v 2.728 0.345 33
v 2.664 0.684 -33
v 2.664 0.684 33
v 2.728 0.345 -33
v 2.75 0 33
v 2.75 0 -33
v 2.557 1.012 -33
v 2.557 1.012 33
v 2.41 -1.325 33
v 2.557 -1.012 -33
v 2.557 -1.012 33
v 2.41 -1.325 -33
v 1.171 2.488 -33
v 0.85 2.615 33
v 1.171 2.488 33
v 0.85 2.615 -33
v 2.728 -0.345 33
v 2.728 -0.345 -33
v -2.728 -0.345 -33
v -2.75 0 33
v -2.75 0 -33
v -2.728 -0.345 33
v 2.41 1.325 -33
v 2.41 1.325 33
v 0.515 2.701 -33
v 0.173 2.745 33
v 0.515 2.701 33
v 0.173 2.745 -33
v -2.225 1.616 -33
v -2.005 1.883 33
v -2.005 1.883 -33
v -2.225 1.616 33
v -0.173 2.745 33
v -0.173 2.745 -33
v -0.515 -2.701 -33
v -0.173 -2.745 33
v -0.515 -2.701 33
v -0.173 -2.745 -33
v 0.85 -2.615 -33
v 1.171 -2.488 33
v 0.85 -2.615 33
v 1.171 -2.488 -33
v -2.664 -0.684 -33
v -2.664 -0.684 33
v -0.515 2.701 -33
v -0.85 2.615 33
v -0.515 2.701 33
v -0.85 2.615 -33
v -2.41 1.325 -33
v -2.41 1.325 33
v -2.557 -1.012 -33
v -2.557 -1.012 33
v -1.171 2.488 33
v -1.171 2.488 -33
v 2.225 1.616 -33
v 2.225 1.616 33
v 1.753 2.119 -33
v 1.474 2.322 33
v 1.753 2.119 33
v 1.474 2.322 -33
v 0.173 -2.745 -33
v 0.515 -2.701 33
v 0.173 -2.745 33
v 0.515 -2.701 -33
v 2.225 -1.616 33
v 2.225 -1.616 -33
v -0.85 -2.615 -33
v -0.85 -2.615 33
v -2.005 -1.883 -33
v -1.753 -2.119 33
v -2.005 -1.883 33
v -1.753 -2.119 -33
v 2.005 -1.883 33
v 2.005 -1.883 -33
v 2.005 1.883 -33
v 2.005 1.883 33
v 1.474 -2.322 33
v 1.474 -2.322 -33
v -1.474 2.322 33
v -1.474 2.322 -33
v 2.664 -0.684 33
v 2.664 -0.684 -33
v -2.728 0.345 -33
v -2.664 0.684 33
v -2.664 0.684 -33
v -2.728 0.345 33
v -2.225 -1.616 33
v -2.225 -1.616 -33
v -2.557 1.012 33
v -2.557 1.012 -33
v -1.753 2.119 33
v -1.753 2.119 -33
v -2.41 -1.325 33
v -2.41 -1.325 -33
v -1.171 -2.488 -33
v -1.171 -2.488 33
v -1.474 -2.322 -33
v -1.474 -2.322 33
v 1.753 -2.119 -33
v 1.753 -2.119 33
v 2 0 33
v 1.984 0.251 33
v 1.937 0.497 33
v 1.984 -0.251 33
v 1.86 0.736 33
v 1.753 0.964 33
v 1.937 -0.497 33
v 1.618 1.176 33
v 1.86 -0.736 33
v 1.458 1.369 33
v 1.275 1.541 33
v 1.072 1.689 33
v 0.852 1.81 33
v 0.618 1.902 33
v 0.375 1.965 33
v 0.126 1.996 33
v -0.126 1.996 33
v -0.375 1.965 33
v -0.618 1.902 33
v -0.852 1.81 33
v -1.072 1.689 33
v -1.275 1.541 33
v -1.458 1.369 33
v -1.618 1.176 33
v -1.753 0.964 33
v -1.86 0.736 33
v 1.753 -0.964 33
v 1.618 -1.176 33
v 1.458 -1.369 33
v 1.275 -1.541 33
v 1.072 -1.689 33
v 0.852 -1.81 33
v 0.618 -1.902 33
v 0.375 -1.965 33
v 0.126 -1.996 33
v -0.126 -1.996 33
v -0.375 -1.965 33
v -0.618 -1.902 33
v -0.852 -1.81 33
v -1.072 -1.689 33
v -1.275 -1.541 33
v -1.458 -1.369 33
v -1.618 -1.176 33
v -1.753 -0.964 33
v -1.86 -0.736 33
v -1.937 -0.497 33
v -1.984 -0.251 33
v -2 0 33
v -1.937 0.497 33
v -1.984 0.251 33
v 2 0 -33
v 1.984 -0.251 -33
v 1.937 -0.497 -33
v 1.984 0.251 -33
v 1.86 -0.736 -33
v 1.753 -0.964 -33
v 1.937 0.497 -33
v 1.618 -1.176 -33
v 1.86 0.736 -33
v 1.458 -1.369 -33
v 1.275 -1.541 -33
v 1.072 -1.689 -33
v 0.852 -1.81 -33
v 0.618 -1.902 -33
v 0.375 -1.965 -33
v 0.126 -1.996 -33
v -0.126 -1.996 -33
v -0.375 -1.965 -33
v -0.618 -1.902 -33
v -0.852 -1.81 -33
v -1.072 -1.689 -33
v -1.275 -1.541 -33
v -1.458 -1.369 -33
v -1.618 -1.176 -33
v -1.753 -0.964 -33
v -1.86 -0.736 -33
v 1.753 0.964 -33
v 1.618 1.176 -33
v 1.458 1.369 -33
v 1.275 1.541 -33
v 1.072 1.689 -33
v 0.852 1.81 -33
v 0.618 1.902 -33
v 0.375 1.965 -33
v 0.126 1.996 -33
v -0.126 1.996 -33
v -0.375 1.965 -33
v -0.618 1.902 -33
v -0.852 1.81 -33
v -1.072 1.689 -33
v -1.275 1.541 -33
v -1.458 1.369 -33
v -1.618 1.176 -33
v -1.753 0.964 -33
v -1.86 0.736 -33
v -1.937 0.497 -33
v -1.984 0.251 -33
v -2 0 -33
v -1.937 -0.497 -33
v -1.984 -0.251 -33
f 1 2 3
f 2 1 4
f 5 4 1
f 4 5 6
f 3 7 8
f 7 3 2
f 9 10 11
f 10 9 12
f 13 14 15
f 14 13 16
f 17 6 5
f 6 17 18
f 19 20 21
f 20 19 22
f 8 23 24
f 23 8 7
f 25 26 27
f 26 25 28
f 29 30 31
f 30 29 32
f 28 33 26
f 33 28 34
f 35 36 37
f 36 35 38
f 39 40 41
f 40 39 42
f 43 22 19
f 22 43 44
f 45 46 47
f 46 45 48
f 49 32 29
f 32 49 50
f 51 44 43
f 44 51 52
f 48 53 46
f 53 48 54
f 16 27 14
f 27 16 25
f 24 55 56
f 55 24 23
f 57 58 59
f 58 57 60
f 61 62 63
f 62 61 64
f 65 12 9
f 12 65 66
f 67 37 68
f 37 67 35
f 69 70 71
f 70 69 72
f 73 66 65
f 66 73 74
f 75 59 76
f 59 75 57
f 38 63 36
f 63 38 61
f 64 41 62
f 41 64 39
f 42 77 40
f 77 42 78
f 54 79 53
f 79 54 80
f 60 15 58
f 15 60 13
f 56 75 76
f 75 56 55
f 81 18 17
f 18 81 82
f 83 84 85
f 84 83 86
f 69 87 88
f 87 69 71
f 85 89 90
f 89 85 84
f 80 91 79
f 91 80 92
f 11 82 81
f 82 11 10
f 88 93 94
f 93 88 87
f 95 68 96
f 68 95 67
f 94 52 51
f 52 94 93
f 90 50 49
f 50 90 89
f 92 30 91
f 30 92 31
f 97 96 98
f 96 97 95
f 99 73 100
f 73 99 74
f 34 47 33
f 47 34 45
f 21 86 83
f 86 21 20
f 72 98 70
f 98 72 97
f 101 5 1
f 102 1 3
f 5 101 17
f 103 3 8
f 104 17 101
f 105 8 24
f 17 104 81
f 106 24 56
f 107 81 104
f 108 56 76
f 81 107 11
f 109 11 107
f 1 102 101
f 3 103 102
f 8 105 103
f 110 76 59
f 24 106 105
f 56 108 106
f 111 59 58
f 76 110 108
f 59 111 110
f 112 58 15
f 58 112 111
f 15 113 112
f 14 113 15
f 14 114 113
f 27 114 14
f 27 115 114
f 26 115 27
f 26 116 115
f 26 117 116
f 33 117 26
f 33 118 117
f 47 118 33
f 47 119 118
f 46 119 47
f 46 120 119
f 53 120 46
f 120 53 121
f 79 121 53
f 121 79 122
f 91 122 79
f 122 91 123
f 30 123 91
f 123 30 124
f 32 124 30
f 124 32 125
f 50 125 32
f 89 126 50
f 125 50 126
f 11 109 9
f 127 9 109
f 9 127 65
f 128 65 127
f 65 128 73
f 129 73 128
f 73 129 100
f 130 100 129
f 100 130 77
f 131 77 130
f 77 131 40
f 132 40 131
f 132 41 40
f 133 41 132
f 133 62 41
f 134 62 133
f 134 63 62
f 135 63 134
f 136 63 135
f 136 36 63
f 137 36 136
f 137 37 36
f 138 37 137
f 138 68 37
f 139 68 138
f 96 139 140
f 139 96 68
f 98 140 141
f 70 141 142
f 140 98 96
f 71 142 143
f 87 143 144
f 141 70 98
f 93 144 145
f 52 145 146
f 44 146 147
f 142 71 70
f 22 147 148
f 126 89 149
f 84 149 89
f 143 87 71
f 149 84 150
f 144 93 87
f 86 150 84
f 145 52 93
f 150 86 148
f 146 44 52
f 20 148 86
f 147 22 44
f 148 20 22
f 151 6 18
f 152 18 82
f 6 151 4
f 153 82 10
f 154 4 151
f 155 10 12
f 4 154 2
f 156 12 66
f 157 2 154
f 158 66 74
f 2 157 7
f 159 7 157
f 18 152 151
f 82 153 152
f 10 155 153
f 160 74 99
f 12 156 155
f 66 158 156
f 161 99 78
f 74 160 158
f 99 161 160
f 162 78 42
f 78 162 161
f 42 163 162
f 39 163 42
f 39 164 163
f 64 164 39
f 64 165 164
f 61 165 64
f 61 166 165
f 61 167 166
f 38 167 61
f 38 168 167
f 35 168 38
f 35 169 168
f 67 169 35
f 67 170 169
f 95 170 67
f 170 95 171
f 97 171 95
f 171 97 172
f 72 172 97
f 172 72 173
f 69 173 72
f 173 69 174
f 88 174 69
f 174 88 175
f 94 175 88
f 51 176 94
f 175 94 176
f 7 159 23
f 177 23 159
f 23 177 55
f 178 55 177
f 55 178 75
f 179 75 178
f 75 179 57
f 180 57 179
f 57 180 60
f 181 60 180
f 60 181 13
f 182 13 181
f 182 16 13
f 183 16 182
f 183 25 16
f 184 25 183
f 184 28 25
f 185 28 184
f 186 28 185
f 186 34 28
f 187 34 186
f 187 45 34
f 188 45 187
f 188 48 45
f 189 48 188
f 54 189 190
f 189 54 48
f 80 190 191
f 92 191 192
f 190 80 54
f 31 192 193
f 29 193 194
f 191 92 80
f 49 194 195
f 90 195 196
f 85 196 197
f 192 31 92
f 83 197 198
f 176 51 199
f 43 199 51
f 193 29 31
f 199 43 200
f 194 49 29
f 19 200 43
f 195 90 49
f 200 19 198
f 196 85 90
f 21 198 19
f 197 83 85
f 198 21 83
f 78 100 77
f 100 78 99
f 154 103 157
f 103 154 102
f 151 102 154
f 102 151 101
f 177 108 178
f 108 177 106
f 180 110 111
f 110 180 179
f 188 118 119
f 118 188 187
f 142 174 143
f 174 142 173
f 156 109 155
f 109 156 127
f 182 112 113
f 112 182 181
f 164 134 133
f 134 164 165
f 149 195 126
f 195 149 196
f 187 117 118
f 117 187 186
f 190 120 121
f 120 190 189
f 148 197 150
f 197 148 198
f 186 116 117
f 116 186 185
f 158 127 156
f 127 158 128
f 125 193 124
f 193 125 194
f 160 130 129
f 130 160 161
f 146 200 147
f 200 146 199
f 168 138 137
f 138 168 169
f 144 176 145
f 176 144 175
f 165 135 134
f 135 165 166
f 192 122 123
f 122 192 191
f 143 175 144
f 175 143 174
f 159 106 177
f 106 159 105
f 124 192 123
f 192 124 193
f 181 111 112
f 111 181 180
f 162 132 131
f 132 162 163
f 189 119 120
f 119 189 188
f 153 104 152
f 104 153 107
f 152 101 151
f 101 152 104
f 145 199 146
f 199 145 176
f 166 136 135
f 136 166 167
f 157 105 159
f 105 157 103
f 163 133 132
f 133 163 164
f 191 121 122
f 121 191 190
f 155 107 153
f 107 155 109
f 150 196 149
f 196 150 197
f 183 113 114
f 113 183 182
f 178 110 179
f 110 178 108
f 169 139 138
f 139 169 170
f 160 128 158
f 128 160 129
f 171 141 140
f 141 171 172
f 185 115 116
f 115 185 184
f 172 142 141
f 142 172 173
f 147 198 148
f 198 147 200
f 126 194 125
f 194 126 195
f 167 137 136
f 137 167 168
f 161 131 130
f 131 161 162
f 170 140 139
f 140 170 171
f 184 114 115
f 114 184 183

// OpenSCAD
$fn = 50;


difference() {
	union() {
		translate(v = [0, 0, -33.0000000000]) {
			cylinder(h = 66, r = 2.7500000000);
		}
	}
	union() {
		translate(v = [0, 0, -100.0000000000]) {
			cylinder(h = 200, r = 2.0000000000);
		}
	}
}
